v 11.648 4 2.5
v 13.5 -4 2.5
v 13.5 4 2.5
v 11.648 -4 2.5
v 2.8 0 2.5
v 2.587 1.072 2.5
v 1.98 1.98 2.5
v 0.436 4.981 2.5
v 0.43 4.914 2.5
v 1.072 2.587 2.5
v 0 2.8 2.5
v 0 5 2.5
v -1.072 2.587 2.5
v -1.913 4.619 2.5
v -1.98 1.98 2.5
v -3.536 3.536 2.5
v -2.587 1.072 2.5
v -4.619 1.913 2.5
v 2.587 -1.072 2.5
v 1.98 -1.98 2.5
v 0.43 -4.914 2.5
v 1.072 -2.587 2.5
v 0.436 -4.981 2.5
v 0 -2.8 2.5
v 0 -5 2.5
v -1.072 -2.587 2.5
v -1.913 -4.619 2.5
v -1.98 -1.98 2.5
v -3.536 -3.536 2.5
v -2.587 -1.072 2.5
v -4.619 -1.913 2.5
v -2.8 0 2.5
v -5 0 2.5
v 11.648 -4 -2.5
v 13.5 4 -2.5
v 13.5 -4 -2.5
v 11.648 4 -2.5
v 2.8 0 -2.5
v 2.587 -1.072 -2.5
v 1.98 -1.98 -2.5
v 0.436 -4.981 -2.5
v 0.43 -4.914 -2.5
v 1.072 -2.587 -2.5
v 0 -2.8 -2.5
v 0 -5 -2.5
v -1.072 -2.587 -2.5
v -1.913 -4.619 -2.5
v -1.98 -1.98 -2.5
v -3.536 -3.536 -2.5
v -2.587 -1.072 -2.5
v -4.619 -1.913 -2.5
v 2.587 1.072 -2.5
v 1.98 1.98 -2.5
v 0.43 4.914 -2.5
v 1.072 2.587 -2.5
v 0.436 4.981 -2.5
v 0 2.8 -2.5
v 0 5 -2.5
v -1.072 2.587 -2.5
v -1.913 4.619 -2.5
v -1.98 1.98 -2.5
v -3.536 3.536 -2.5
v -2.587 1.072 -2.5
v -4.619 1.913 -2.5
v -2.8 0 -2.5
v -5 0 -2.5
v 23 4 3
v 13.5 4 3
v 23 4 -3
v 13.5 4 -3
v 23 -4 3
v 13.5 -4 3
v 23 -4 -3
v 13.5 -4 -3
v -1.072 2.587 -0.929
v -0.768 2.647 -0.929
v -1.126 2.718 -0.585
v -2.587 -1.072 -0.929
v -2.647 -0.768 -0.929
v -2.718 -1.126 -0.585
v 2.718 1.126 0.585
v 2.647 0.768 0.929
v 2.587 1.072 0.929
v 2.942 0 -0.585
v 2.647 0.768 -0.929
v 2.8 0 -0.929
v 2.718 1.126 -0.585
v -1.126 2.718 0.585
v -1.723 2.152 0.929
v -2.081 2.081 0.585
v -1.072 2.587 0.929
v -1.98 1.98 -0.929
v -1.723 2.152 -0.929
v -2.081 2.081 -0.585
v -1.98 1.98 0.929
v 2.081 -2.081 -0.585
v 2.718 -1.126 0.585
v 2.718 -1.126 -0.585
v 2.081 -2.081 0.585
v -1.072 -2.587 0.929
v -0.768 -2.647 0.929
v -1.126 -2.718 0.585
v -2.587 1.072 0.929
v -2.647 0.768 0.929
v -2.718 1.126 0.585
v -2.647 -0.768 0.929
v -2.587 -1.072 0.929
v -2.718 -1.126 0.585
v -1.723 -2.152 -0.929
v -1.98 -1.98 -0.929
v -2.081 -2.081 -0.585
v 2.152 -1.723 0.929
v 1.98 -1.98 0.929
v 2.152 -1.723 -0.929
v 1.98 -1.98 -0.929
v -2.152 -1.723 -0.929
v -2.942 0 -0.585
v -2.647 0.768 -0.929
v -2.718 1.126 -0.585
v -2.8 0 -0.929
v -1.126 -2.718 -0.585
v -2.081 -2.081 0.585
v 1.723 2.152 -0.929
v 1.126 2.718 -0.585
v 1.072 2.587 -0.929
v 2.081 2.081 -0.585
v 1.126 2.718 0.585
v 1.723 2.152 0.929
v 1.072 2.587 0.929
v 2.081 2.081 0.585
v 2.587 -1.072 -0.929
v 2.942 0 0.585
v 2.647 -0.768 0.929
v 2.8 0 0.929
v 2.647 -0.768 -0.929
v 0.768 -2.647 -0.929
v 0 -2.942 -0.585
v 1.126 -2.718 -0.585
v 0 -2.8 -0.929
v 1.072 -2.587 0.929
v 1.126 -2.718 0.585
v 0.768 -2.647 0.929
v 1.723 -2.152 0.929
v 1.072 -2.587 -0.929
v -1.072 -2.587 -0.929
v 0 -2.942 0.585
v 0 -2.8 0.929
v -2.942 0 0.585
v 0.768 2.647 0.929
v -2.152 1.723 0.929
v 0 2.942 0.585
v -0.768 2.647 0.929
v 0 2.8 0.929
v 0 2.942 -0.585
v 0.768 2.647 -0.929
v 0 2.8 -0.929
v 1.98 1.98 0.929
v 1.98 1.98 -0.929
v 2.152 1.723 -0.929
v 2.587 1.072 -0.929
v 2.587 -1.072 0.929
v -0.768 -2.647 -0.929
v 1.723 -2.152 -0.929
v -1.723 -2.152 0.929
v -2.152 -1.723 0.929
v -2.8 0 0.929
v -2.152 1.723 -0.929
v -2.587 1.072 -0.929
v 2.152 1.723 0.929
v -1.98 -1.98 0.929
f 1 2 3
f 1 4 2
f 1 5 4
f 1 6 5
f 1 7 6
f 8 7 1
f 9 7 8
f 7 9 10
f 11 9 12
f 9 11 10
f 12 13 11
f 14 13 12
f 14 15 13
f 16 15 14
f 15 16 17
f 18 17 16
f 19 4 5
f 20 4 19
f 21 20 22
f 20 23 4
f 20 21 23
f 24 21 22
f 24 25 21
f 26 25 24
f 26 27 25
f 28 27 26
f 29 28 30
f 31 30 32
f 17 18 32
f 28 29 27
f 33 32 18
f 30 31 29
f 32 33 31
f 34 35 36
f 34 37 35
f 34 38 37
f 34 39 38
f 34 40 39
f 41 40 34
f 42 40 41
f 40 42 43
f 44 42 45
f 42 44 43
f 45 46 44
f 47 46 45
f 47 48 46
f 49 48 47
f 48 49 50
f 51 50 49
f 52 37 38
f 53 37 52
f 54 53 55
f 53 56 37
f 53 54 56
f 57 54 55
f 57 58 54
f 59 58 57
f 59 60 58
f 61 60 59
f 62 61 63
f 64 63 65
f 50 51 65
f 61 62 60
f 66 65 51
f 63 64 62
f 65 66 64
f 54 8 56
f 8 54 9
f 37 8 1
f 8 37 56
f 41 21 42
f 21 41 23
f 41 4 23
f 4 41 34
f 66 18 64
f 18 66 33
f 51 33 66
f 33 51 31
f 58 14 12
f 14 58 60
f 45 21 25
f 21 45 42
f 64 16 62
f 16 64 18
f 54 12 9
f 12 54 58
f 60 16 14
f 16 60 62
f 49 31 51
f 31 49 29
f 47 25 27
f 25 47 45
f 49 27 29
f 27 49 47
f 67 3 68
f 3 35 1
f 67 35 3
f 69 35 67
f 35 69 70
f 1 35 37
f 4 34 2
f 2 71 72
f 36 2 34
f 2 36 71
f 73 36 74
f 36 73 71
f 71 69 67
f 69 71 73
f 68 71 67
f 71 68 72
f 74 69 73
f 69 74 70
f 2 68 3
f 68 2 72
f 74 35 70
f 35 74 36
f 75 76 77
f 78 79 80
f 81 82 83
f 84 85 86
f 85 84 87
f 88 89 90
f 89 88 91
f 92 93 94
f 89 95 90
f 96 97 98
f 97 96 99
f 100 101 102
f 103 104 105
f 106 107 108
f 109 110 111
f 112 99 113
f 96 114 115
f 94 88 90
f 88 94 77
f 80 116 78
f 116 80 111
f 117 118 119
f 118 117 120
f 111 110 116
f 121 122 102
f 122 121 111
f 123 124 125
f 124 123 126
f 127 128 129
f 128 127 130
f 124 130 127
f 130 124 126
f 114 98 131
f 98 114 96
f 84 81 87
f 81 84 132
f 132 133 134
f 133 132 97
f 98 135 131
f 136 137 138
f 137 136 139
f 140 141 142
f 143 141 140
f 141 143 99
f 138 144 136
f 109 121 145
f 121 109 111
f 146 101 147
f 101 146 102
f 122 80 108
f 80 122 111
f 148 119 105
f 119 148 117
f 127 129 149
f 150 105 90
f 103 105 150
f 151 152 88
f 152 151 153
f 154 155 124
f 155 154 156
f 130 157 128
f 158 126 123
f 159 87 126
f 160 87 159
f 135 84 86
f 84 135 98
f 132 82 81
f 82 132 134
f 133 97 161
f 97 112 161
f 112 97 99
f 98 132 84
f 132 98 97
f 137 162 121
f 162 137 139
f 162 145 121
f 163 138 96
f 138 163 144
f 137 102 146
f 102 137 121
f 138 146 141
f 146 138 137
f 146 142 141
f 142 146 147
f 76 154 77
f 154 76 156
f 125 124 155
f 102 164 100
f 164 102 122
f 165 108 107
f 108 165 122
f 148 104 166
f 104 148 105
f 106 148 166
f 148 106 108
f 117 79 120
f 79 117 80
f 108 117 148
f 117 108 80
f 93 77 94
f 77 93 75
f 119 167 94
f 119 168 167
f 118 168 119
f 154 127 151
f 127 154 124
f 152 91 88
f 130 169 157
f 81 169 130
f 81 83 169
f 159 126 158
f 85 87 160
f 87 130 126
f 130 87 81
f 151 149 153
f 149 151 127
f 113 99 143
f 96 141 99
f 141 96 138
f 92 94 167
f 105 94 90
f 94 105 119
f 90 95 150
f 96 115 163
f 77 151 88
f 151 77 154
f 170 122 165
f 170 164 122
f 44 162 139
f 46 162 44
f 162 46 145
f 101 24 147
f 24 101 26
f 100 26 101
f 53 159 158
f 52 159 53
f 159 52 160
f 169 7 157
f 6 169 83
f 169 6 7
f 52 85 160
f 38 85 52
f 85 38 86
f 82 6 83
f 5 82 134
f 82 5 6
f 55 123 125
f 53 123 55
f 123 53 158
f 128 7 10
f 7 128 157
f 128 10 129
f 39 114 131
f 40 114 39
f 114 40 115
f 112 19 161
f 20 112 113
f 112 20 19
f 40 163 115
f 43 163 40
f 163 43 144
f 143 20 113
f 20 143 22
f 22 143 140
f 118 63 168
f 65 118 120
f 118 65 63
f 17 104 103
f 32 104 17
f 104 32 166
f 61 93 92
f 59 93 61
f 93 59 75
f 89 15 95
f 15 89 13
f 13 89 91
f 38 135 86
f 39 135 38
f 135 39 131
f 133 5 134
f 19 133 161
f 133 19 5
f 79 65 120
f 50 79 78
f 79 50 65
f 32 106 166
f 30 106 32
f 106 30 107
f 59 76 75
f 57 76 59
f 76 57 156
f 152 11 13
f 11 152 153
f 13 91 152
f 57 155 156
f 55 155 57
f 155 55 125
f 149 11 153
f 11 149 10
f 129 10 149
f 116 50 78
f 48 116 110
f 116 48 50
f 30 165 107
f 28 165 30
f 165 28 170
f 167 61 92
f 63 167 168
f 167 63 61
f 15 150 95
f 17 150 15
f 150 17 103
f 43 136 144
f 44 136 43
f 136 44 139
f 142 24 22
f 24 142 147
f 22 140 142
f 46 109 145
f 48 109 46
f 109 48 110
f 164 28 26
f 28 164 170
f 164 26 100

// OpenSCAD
// file: ../configuration.scad
$fa = 2;
$fs = 0.5;

motor_end_height=44;
idler_end_height=28;
carriage_height=13.8;
platform_thickness=10;
platform_fix_dia=28;
platform_dia=38;

bearing_diameter=16;
bearing_dia_clearence=0.5;
bearing_free_dia_clearence=0.8;

hotend_diameter=16.4;
hotend_groove_dia=12;

// Frames

// Places mounting holes for the controller
// 33 = RAMPS 1.3 (Power outputs: Extruder, Bed, Fan)
// 34 = RAMPS 1.3 (Power outputs: Extruder0, Extruder1, Bed)
// 35 = RAMPS 1.3 (Power outputs: Extruder, Fan, Fan)
// 70 = Megatronics
// 701 = Megatronics 2.0

motherboard=35;

frame_thickness=8;

// Distance from motor axle to idler axle
// Calculated regarding length of the HTD3M closed belt 
belt_tooth=354;
spacing = round(((belt_tooth*3) - 3.14159 * 24.83) / 2);

rod_length=spacing+55;
rod_diameter=8;
//platform_hinge_offset=25;
//carriage_hinge_offset=17;

printbed_diameter=170;	//printable aera
printbed_thickness=4;		// used for rendering and approximating build volume


//corner_radius=12;
//frame_radius=(tower_radius-rod_diameter/2-corner_radius)/cos(30);

ball_link_distance=40;//55;
ball_offset=6.5;
ball_distance=ball_link_distance-2*ball_offset;
ball_angle=25;

// Delta Settings

delta_smooth_rod_offset=139.5;//140 - 152 floor(printbed_diameter/(2*sin(ball_angle))-printbed_diameter/2+delta_effector_offset+delta_carriage_offset)
delta_effector_offset=18;
delta_carriage_offset=18;
delta_diagonal_rod=ceil(max(printbed_diameter/2+delta_smooth_rod_offset-delta_effector_offset-delta_carriage_offset,printbed_diameter/(2*sin(ball_angle))));
//|-> 202
delta_radius=(delta_smooth_rod_offset-delta_effector_offset-delta_carriage_offset);

diagonal_rod_length=delta_diagonal_rod-2*8;//165
diagonal_rod_diameter=3;
diagonal_rod_length_lost=(printbed_diameter/(2*sin(ball_angle)))-(printbed_diameter/2+delta_smooth_rod_offset-delta_effector_offset-delta_carriage_offset);

diagonal_rod_angle=acos(delta_radius/delta_diagonal_rod);

echo_result=true;

carriage_altitude=sqrt(pow(delta_diagonal_rod,2)-pow(delta_radius,2));



if(echo_result) {
	echo("printbed_diameter",printbed_diameter);
	echo("delta_diagonal_rod",delta_diagonal_rod);
	echo("diagonal_rod_length",diagonal_rod_length);
	echo("delta_effector_offset",delta_effector_offset);
	echo("delta_carriage_offset",delta_carriage_offset);
	echo("delta_radius",delta_radius);
	echo("diagonal_rod_angle",diagonal_rod_angle);
	echo("carriage_altitude",carriage_altitude);
	echo("diagonal_rod_length_lost",diagonal_rod_length_lost);
	echo("delta_smooth_rod_offset_optimum",printbed_diameter/(2*sin(ball_angle))-printbed_diameter/2+delta_effector_offset+delta_carriage_offset);
	echo("rod_length",rod_length);
}
// main file
include <../configuration.scad>;

$fn=16;

ball_link();

module ball_link() {
	color("DarkSlateGray") difference() {
		union() {
			cylinder(h = 5, r = 5, center = true);
			translate([(23-9)/2,0,0]) cube([23-9,8,5],true);
			translate([23-(9.5)/2,0,0]) cube([9.5,8,6],true);
			for(m = [0,1]) mirror([ 0, m, 0 ]) rotate([0,0,-5]) translate([0,0,-2.5]) cube([12,5,5],false);
		}
		sphere(r=3,center = true);
		cylinder(h = 10, r = 2.8, center = true);
		//sphere(r= 4);
	}
}
